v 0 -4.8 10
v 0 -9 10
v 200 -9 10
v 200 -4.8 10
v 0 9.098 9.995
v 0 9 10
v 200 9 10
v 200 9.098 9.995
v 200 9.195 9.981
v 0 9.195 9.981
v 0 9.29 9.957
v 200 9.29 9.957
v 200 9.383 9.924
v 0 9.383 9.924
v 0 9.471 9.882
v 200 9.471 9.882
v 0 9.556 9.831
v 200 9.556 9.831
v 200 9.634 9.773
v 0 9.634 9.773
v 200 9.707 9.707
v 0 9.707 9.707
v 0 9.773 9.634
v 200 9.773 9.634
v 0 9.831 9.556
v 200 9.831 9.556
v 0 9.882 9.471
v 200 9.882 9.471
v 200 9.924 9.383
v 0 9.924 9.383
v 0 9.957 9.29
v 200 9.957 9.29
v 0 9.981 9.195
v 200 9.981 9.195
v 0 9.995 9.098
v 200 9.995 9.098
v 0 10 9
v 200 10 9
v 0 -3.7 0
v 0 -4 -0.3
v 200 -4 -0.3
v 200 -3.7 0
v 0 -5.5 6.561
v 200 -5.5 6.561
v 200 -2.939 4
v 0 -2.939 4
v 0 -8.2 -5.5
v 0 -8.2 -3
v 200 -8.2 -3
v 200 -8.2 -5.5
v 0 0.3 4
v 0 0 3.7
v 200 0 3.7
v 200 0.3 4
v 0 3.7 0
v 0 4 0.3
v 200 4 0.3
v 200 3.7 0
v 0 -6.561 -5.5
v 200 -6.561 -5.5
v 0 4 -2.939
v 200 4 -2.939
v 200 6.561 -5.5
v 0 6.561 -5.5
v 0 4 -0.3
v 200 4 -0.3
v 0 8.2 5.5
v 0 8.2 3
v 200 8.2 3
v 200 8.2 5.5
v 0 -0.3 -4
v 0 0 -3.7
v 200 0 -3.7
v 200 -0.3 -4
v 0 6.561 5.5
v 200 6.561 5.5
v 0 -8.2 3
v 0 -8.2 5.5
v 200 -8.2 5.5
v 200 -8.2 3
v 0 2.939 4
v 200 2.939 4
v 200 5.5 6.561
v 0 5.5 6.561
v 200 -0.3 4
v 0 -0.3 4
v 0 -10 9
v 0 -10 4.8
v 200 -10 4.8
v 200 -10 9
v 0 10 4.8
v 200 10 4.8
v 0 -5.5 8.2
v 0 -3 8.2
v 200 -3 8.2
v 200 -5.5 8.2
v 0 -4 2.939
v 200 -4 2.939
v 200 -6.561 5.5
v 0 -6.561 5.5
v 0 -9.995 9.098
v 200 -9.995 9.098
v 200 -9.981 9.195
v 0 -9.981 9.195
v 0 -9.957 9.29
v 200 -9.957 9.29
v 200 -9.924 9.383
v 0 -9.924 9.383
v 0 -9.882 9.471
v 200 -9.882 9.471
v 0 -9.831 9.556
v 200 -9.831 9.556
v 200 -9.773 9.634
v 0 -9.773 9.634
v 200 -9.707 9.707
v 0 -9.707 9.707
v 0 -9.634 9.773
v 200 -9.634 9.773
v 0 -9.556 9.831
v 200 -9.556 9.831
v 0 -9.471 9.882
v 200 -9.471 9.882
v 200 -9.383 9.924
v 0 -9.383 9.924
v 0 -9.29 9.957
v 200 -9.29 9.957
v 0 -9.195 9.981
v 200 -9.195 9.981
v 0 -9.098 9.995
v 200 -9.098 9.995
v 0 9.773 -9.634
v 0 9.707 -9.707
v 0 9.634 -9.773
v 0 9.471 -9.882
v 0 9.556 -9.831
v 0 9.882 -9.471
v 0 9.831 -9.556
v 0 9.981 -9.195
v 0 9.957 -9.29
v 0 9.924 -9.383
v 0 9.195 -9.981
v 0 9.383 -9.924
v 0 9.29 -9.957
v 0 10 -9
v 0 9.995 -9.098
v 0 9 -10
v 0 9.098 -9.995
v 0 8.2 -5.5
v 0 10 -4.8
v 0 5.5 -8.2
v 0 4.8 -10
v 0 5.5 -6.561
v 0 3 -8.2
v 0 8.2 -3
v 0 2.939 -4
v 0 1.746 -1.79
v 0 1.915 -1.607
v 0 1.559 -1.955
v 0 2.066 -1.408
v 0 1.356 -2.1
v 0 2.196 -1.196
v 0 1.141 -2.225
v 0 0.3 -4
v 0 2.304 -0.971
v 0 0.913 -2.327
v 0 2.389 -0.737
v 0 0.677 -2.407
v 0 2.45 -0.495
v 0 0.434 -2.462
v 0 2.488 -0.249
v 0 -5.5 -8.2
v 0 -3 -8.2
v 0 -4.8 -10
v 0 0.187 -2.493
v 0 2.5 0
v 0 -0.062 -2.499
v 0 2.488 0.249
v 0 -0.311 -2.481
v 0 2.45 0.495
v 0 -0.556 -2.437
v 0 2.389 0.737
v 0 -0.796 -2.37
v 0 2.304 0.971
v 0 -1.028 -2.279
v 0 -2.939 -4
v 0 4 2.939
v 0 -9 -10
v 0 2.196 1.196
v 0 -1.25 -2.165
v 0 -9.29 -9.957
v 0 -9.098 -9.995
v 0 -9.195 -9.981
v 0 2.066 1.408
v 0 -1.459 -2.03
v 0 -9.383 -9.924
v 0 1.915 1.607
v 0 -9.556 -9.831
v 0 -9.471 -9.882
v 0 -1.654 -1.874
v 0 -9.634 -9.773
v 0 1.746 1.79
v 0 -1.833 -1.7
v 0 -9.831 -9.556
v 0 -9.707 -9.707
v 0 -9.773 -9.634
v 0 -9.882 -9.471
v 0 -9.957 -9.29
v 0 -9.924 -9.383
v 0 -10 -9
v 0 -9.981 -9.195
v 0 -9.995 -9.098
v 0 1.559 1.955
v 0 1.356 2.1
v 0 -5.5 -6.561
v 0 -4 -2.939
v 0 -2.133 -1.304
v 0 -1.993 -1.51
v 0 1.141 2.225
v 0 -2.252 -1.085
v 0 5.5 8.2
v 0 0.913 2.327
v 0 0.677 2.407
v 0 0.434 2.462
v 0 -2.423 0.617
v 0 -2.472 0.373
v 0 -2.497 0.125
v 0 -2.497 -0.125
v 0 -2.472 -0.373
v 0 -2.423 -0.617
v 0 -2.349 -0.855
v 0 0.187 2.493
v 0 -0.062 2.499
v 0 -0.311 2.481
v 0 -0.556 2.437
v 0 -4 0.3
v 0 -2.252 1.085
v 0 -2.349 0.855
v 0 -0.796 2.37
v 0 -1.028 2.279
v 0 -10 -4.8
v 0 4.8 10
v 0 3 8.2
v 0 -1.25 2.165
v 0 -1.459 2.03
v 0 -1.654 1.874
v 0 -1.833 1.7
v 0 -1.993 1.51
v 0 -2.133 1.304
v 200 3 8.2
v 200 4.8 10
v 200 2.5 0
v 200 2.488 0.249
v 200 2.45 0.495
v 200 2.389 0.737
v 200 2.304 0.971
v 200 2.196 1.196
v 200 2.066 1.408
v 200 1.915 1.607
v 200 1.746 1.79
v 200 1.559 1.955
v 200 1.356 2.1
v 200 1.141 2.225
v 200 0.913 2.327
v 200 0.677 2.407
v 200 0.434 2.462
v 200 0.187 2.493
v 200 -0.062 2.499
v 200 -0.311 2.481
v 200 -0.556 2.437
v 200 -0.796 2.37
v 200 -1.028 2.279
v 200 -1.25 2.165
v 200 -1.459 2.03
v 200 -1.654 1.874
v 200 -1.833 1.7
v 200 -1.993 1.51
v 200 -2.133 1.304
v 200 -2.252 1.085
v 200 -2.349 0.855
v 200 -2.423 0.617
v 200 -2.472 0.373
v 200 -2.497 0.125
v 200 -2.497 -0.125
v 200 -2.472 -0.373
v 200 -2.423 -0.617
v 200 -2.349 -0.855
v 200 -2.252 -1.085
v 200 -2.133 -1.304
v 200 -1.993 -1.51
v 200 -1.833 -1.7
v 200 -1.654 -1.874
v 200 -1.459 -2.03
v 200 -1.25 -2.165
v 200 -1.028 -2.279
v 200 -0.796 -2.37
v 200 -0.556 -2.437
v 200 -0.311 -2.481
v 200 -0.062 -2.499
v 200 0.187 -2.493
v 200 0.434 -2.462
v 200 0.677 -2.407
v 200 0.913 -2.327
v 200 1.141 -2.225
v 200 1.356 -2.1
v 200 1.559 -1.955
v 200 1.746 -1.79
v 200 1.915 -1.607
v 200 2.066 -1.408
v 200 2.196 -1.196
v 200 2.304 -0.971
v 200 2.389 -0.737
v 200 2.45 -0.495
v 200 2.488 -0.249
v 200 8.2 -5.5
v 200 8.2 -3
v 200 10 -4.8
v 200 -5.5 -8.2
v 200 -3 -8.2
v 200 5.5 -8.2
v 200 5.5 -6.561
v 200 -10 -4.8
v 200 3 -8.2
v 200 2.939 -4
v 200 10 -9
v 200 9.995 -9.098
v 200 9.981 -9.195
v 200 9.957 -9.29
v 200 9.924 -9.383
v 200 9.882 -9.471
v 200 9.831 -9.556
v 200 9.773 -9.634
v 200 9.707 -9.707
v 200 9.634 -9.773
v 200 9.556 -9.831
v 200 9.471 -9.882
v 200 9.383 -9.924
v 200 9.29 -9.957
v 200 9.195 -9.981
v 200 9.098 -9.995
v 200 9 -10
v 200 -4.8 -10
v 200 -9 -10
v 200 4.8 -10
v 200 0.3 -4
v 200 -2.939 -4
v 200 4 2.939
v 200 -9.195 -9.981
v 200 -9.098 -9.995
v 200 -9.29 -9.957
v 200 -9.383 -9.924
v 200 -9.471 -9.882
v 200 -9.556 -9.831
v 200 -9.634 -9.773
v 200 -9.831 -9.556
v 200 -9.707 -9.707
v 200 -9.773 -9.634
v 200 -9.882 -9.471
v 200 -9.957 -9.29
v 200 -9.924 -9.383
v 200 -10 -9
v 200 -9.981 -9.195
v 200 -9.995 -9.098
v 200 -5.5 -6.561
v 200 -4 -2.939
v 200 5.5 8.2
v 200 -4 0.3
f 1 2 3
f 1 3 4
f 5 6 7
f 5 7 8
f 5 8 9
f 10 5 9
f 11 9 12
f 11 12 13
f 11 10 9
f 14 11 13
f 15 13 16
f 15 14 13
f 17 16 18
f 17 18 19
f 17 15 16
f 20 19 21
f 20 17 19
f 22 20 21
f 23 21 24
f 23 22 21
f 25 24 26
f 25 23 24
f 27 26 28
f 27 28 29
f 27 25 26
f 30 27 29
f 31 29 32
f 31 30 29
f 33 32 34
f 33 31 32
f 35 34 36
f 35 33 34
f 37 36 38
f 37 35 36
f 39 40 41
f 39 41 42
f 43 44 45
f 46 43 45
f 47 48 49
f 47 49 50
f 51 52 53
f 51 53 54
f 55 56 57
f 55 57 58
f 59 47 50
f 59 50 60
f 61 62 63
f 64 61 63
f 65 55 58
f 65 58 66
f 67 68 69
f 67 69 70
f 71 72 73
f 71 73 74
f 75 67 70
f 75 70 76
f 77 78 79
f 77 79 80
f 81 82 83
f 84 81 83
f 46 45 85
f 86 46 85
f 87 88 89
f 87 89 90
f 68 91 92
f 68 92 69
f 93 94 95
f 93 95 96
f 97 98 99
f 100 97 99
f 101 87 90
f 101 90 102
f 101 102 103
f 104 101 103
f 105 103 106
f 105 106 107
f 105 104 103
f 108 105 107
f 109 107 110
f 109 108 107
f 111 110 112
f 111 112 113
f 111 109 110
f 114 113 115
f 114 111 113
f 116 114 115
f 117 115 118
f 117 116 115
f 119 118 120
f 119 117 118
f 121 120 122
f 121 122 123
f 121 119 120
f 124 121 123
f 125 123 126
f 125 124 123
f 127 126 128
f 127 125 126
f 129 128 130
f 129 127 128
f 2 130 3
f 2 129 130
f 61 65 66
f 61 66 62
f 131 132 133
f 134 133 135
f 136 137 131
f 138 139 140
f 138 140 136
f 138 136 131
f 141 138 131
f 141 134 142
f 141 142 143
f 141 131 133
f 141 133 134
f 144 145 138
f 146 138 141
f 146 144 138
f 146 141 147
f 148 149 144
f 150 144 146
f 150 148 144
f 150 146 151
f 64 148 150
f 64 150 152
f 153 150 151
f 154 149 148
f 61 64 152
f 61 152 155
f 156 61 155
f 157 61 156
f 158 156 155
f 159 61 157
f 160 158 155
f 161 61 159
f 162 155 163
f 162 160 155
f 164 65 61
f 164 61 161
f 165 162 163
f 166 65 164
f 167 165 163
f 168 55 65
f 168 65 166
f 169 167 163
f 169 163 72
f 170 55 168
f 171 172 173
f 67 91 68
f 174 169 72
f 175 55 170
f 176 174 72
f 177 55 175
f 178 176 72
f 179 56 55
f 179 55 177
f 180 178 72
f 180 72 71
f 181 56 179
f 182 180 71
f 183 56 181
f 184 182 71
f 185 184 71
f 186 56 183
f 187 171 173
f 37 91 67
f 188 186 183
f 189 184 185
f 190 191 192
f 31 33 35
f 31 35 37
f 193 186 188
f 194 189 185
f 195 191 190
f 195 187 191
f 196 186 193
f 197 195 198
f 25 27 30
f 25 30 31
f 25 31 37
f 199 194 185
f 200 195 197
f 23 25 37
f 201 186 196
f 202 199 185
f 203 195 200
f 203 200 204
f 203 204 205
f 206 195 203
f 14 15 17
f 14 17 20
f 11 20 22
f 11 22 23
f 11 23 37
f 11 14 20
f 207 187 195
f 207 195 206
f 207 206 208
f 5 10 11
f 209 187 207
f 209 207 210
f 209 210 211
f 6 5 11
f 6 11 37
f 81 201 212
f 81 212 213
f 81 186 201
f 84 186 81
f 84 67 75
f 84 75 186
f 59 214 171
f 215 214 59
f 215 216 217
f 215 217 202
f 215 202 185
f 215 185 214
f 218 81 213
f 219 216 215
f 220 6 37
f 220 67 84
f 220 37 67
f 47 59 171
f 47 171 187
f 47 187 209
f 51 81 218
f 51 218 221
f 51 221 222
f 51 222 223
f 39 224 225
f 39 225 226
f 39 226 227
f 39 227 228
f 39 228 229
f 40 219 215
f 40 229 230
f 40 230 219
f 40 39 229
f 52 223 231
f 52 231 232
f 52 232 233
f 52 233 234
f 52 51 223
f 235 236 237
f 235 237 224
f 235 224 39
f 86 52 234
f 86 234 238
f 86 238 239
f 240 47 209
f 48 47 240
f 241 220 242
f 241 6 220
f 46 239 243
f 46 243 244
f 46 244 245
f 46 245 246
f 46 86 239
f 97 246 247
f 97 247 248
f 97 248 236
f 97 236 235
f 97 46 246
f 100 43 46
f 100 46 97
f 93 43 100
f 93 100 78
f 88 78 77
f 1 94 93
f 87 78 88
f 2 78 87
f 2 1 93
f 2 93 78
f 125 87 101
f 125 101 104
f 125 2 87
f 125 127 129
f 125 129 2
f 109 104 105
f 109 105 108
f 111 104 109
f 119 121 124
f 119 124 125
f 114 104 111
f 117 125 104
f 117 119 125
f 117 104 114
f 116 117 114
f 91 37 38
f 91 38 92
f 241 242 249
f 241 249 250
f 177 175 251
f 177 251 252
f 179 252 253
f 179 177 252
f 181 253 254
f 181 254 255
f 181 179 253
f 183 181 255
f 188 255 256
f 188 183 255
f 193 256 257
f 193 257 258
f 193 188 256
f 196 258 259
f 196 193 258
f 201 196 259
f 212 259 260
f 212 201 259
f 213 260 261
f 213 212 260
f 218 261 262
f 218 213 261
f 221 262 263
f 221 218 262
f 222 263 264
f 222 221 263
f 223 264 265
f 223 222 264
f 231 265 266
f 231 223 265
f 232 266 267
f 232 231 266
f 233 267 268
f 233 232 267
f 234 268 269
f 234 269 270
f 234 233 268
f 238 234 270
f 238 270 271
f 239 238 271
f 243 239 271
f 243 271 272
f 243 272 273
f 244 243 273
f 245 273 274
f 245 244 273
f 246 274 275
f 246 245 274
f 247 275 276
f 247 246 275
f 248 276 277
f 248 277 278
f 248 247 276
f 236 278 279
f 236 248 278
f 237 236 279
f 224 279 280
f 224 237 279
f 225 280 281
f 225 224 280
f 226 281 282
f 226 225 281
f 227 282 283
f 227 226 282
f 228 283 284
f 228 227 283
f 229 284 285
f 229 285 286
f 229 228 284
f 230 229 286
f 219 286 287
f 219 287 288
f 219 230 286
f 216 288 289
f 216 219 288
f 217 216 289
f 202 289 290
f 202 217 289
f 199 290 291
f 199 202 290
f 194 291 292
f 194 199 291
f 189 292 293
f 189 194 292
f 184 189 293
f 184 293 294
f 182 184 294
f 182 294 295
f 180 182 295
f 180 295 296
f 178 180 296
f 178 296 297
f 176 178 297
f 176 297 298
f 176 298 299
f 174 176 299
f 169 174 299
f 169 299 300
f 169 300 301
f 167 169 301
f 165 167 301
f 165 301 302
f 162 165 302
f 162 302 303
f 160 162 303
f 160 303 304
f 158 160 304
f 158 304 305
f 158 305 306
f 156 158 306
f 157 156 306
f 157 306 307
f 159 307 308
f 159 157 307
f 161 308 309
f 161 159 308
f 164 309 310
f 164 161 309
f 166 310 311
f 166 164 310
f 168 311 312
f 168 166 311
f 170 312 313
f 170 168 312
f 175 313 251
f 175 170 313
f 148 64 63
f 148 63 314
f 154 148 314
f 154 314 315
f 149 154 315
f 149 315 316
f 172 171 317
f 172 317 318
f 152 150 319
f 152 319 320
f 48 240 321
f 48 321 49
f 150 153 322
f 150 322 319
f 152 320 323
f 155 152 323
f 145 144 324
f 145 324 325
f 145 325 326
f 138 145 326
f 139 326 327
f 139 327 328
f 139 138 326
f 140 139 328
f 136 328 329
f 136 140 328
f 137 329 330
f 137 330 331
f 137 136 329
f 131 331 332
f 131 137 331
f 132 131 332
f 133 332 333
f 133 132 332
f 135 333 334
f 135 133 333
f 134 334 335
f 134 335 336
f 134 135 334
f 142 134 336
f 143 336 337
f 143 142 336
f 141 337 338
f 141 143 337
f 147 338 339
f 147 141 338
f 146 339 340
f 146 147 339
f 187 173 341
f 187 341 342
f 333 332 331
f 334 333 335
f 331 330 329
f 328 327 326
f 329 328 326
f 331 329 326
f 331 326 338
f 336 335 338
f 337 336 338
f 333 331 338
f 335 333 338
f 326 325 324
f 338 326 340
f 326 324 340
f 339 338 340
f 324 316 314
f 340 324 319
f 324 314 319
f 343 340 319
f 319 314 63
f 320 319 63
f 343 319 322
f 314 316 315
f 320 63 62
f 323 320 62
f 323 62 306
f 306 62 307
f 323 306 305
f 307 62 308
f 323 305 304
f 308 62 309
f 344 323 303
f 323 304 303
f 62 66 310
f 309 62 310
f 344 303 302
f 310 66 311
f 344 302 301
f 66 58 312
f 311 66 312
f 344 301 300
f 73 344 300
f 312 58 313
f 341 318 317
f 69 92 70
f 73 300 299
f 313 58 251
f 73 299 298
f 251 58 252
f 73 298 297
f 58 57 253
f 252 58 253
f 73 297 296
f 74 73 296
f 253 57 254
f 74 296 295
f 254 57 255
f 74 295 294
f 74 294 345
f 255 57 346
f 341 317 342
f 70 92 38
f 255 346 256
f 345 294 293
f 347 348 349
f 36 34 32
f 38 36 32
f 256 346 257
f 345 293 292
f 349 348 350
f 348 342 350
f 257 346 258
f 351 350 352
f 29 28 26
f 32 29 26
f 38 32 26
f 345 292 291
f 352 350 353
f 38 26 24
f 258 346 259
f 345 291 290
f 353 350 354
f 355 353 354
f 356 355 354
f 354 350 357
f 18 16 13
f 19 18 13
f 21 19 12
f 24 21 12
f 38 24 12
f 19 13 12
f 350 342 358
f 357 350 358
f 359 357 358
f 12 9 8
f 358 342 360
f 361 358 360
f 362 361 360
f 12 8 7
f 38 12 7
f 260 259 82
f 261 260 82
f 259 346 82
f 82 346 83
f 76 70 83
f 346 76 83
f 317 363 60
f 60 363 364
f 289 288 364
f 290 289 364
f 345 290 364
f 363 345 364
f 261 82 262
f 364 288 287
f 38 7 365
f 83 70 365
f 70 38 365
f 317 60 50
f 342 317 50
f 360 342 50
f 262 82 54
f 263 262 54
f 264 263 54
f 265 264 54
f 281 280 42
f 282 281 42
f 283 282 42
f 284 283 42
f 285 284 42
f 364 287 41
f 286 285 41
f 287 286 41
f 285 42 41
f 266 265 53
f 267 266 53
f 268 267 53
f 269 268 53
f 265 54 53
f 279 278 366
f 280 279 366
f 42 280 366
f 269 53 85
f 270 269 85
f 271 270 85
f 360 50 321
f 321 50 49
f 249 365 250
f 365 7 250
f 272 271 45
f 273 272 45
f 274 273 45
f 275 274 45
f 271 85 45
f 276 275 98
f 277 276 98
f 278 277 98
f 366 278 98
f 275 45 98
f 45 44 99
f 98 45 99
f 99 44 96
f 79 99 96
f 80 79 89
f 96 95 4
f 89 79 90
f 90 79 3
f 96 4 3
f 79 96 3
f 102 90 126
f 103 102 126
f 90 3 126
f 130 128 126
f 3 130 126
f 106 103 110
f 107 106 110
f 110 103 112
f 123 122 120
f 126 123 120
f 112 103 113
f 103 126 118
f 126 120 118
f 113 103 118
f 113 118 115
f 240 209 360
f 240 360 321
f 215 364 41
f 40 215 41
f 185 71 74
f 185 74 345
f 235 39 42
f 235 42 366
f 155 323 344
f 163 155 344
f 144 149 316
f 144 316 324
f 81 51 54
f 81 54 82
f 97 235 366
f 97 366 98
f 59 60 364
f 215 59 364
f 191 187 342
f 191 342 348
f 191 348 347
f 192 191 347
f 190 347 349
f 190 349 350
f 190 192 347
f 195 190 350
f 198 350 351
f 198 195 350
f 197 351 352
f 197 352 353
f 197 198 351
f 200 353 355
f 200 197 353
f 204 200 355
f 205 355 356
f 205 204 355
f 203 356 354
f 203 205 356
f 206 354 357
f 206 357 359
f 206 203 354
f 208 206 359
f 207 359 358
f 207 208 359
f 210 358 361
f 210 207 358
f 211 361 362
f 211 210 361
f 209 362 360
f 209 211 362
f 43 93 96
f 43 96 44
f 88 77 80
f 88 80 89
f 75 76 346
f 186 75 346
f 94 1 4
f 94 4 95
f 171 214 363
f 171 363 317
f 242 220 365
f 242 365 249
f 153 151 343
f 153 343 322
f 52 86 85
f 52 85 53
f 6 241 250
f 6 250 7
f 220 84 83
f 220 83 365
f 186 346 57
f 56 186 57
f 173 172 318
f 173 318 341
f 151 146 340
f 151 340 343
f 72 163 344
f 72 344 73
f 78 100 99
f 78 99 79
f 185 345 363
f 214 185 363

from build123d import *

# Parameters (mm, degrees)
SKETCH11_R                                  = 2.5
QUADRADO_PF20_11_PERFIL_2020_V_SLOT_1_DEPTH = 200


with BuildPart() as part:
    # Sketch11 → Quadrado PF20-11 - PERFIL 2020 V-SLOT(1) (new body)
    with BuildSketch(Plane.YZ):
        with BuildLine():
            Line((-4.8, 10), (-3, 8.2))
            Line((-3, 8.2), (-5.5, 8.2))
            Line((-5.5, 8.2), (-5.5, 6.560660172))
            Line((-5.5, 6.560660172), (-2.939339828, 4))
            Line((-2.939339828, 4), (-0.3, 4))
            Line((-0.3, 4), (0, 3.7))
            Line((0, 3.7), (0.3, 4))
            Line((0.3, 4), (2.939339828, 4))
            Line((2.939339828, 4), (5.5, 6.560660172))
            Line((5.5, 6.560660172), (5.5, 8.2))
            Line((5.5, 8.2), (3, 8.2))
            Line((3, 8.2), (4.8, 10))
            Line((4.8, 10), (9, 10))
            ThreePointArc((9, 10), (9.707106781, 9.707106781), (10, 9))
            Line((10, 9), (10, 4.8))
            Line((10, 4.8), (8.2, 3))
            Line((8.2, 3), (8.2, 5.5))
            Line((8.2, 5.5), (6.560660172, 5.5))
            Line((6.560660172, 5.5), (4, 2.939339828))
            Line((4, 2.939339828), (4, 0.3))
            Line((4, 0.3), (3.7, 0))
            Line((3.7, 0), (4, -0.3))
            Line((4, -0.3), (4, -2.939339828))
            Line((4, -2.939339828), (6.560660172, -5.5))
            Line((6.560660172, -5.5), (8.2, -5.5))
            Line((8.2, -5.5), (8.2, -3))
            Line((8.2, -3), (10, -4.8))
            Line((10, -4.8), (10, -9))
            ThreePointArc((10, -9), (9.707106781, -9.707106781), (9, -10))
            Line((9, -10), (4.8, -10))
            Line((4.8, -10), (3, -8.2))
            Line((3, -8.2), (5.5, -8.2))
            Line((5.5, -8.2), (5.5, -6.560660172))
            Line((5.5, -6.560660172), (2.939339828, -4))
            Line((2.939339828, -4), (0.3, -4))
            Line((0.3, -4), (0, -3.7))
            Line((0, -3.7), (-0.3, -4))
            Line((-0.3, -4), (-2.939339828, -4))
            Line((-2.939339828, -4), (-5.5, -6.560660172))
            Line((-5.5, -6.560660172), (-5.5, -8.2))
            Line((-5.5, -8.2), (-3, -8.2))
            Line((-3, -8.2), (-4.8, -10))
            Line((-4.8, -10), (-9, -10))
            ThreePointArc((-9, -10), (-9.707106781, -9.707106781), (-10, -9))
            Line((-10, -9), (-10, -4.8))
            Line((-10, -4.8), (-8.2, -3))
            Line((-8.2, -3), (-8.2, -5.5))
            Line((-8.2, -5.5), (-6.560660172, -5.5))
            Line((-6.560660172, -5.5), (-4, -2.939339828))
            Line((-4, -2.939339828), (-4, -0.3))
            Line((-4, -0.3), (-3.7, 0))
            Line((-3.7, 0), (-4, 0.3))
            Line((-4, 0.3), (-4, 2.939339828))
            Line((-4, 2.939339828), (-6.560660172, 5.5))
            Line((-6.560660172, 5.5), (-8.2, 5.5))
            Line((-8.2, 5.5), (-8.2, 3))
            Line((-8.2, 3), (-10, 4.8))
            Line((-10, 4.8), (-10, 9))
            ThreePointArc((-10, 9), (-9.707106781, 9.707106781), (-9, 10))
            Line((-9, 10), (-4.8, 10))
        make_face()
        Circle(SKETCH11_R, mode=Mode.SUBTRACT)
    extrude(amount=QUADRADO_PF20_11_PERFIL_2020_V_SLOT_1_DEPTH)


solid = part.part
